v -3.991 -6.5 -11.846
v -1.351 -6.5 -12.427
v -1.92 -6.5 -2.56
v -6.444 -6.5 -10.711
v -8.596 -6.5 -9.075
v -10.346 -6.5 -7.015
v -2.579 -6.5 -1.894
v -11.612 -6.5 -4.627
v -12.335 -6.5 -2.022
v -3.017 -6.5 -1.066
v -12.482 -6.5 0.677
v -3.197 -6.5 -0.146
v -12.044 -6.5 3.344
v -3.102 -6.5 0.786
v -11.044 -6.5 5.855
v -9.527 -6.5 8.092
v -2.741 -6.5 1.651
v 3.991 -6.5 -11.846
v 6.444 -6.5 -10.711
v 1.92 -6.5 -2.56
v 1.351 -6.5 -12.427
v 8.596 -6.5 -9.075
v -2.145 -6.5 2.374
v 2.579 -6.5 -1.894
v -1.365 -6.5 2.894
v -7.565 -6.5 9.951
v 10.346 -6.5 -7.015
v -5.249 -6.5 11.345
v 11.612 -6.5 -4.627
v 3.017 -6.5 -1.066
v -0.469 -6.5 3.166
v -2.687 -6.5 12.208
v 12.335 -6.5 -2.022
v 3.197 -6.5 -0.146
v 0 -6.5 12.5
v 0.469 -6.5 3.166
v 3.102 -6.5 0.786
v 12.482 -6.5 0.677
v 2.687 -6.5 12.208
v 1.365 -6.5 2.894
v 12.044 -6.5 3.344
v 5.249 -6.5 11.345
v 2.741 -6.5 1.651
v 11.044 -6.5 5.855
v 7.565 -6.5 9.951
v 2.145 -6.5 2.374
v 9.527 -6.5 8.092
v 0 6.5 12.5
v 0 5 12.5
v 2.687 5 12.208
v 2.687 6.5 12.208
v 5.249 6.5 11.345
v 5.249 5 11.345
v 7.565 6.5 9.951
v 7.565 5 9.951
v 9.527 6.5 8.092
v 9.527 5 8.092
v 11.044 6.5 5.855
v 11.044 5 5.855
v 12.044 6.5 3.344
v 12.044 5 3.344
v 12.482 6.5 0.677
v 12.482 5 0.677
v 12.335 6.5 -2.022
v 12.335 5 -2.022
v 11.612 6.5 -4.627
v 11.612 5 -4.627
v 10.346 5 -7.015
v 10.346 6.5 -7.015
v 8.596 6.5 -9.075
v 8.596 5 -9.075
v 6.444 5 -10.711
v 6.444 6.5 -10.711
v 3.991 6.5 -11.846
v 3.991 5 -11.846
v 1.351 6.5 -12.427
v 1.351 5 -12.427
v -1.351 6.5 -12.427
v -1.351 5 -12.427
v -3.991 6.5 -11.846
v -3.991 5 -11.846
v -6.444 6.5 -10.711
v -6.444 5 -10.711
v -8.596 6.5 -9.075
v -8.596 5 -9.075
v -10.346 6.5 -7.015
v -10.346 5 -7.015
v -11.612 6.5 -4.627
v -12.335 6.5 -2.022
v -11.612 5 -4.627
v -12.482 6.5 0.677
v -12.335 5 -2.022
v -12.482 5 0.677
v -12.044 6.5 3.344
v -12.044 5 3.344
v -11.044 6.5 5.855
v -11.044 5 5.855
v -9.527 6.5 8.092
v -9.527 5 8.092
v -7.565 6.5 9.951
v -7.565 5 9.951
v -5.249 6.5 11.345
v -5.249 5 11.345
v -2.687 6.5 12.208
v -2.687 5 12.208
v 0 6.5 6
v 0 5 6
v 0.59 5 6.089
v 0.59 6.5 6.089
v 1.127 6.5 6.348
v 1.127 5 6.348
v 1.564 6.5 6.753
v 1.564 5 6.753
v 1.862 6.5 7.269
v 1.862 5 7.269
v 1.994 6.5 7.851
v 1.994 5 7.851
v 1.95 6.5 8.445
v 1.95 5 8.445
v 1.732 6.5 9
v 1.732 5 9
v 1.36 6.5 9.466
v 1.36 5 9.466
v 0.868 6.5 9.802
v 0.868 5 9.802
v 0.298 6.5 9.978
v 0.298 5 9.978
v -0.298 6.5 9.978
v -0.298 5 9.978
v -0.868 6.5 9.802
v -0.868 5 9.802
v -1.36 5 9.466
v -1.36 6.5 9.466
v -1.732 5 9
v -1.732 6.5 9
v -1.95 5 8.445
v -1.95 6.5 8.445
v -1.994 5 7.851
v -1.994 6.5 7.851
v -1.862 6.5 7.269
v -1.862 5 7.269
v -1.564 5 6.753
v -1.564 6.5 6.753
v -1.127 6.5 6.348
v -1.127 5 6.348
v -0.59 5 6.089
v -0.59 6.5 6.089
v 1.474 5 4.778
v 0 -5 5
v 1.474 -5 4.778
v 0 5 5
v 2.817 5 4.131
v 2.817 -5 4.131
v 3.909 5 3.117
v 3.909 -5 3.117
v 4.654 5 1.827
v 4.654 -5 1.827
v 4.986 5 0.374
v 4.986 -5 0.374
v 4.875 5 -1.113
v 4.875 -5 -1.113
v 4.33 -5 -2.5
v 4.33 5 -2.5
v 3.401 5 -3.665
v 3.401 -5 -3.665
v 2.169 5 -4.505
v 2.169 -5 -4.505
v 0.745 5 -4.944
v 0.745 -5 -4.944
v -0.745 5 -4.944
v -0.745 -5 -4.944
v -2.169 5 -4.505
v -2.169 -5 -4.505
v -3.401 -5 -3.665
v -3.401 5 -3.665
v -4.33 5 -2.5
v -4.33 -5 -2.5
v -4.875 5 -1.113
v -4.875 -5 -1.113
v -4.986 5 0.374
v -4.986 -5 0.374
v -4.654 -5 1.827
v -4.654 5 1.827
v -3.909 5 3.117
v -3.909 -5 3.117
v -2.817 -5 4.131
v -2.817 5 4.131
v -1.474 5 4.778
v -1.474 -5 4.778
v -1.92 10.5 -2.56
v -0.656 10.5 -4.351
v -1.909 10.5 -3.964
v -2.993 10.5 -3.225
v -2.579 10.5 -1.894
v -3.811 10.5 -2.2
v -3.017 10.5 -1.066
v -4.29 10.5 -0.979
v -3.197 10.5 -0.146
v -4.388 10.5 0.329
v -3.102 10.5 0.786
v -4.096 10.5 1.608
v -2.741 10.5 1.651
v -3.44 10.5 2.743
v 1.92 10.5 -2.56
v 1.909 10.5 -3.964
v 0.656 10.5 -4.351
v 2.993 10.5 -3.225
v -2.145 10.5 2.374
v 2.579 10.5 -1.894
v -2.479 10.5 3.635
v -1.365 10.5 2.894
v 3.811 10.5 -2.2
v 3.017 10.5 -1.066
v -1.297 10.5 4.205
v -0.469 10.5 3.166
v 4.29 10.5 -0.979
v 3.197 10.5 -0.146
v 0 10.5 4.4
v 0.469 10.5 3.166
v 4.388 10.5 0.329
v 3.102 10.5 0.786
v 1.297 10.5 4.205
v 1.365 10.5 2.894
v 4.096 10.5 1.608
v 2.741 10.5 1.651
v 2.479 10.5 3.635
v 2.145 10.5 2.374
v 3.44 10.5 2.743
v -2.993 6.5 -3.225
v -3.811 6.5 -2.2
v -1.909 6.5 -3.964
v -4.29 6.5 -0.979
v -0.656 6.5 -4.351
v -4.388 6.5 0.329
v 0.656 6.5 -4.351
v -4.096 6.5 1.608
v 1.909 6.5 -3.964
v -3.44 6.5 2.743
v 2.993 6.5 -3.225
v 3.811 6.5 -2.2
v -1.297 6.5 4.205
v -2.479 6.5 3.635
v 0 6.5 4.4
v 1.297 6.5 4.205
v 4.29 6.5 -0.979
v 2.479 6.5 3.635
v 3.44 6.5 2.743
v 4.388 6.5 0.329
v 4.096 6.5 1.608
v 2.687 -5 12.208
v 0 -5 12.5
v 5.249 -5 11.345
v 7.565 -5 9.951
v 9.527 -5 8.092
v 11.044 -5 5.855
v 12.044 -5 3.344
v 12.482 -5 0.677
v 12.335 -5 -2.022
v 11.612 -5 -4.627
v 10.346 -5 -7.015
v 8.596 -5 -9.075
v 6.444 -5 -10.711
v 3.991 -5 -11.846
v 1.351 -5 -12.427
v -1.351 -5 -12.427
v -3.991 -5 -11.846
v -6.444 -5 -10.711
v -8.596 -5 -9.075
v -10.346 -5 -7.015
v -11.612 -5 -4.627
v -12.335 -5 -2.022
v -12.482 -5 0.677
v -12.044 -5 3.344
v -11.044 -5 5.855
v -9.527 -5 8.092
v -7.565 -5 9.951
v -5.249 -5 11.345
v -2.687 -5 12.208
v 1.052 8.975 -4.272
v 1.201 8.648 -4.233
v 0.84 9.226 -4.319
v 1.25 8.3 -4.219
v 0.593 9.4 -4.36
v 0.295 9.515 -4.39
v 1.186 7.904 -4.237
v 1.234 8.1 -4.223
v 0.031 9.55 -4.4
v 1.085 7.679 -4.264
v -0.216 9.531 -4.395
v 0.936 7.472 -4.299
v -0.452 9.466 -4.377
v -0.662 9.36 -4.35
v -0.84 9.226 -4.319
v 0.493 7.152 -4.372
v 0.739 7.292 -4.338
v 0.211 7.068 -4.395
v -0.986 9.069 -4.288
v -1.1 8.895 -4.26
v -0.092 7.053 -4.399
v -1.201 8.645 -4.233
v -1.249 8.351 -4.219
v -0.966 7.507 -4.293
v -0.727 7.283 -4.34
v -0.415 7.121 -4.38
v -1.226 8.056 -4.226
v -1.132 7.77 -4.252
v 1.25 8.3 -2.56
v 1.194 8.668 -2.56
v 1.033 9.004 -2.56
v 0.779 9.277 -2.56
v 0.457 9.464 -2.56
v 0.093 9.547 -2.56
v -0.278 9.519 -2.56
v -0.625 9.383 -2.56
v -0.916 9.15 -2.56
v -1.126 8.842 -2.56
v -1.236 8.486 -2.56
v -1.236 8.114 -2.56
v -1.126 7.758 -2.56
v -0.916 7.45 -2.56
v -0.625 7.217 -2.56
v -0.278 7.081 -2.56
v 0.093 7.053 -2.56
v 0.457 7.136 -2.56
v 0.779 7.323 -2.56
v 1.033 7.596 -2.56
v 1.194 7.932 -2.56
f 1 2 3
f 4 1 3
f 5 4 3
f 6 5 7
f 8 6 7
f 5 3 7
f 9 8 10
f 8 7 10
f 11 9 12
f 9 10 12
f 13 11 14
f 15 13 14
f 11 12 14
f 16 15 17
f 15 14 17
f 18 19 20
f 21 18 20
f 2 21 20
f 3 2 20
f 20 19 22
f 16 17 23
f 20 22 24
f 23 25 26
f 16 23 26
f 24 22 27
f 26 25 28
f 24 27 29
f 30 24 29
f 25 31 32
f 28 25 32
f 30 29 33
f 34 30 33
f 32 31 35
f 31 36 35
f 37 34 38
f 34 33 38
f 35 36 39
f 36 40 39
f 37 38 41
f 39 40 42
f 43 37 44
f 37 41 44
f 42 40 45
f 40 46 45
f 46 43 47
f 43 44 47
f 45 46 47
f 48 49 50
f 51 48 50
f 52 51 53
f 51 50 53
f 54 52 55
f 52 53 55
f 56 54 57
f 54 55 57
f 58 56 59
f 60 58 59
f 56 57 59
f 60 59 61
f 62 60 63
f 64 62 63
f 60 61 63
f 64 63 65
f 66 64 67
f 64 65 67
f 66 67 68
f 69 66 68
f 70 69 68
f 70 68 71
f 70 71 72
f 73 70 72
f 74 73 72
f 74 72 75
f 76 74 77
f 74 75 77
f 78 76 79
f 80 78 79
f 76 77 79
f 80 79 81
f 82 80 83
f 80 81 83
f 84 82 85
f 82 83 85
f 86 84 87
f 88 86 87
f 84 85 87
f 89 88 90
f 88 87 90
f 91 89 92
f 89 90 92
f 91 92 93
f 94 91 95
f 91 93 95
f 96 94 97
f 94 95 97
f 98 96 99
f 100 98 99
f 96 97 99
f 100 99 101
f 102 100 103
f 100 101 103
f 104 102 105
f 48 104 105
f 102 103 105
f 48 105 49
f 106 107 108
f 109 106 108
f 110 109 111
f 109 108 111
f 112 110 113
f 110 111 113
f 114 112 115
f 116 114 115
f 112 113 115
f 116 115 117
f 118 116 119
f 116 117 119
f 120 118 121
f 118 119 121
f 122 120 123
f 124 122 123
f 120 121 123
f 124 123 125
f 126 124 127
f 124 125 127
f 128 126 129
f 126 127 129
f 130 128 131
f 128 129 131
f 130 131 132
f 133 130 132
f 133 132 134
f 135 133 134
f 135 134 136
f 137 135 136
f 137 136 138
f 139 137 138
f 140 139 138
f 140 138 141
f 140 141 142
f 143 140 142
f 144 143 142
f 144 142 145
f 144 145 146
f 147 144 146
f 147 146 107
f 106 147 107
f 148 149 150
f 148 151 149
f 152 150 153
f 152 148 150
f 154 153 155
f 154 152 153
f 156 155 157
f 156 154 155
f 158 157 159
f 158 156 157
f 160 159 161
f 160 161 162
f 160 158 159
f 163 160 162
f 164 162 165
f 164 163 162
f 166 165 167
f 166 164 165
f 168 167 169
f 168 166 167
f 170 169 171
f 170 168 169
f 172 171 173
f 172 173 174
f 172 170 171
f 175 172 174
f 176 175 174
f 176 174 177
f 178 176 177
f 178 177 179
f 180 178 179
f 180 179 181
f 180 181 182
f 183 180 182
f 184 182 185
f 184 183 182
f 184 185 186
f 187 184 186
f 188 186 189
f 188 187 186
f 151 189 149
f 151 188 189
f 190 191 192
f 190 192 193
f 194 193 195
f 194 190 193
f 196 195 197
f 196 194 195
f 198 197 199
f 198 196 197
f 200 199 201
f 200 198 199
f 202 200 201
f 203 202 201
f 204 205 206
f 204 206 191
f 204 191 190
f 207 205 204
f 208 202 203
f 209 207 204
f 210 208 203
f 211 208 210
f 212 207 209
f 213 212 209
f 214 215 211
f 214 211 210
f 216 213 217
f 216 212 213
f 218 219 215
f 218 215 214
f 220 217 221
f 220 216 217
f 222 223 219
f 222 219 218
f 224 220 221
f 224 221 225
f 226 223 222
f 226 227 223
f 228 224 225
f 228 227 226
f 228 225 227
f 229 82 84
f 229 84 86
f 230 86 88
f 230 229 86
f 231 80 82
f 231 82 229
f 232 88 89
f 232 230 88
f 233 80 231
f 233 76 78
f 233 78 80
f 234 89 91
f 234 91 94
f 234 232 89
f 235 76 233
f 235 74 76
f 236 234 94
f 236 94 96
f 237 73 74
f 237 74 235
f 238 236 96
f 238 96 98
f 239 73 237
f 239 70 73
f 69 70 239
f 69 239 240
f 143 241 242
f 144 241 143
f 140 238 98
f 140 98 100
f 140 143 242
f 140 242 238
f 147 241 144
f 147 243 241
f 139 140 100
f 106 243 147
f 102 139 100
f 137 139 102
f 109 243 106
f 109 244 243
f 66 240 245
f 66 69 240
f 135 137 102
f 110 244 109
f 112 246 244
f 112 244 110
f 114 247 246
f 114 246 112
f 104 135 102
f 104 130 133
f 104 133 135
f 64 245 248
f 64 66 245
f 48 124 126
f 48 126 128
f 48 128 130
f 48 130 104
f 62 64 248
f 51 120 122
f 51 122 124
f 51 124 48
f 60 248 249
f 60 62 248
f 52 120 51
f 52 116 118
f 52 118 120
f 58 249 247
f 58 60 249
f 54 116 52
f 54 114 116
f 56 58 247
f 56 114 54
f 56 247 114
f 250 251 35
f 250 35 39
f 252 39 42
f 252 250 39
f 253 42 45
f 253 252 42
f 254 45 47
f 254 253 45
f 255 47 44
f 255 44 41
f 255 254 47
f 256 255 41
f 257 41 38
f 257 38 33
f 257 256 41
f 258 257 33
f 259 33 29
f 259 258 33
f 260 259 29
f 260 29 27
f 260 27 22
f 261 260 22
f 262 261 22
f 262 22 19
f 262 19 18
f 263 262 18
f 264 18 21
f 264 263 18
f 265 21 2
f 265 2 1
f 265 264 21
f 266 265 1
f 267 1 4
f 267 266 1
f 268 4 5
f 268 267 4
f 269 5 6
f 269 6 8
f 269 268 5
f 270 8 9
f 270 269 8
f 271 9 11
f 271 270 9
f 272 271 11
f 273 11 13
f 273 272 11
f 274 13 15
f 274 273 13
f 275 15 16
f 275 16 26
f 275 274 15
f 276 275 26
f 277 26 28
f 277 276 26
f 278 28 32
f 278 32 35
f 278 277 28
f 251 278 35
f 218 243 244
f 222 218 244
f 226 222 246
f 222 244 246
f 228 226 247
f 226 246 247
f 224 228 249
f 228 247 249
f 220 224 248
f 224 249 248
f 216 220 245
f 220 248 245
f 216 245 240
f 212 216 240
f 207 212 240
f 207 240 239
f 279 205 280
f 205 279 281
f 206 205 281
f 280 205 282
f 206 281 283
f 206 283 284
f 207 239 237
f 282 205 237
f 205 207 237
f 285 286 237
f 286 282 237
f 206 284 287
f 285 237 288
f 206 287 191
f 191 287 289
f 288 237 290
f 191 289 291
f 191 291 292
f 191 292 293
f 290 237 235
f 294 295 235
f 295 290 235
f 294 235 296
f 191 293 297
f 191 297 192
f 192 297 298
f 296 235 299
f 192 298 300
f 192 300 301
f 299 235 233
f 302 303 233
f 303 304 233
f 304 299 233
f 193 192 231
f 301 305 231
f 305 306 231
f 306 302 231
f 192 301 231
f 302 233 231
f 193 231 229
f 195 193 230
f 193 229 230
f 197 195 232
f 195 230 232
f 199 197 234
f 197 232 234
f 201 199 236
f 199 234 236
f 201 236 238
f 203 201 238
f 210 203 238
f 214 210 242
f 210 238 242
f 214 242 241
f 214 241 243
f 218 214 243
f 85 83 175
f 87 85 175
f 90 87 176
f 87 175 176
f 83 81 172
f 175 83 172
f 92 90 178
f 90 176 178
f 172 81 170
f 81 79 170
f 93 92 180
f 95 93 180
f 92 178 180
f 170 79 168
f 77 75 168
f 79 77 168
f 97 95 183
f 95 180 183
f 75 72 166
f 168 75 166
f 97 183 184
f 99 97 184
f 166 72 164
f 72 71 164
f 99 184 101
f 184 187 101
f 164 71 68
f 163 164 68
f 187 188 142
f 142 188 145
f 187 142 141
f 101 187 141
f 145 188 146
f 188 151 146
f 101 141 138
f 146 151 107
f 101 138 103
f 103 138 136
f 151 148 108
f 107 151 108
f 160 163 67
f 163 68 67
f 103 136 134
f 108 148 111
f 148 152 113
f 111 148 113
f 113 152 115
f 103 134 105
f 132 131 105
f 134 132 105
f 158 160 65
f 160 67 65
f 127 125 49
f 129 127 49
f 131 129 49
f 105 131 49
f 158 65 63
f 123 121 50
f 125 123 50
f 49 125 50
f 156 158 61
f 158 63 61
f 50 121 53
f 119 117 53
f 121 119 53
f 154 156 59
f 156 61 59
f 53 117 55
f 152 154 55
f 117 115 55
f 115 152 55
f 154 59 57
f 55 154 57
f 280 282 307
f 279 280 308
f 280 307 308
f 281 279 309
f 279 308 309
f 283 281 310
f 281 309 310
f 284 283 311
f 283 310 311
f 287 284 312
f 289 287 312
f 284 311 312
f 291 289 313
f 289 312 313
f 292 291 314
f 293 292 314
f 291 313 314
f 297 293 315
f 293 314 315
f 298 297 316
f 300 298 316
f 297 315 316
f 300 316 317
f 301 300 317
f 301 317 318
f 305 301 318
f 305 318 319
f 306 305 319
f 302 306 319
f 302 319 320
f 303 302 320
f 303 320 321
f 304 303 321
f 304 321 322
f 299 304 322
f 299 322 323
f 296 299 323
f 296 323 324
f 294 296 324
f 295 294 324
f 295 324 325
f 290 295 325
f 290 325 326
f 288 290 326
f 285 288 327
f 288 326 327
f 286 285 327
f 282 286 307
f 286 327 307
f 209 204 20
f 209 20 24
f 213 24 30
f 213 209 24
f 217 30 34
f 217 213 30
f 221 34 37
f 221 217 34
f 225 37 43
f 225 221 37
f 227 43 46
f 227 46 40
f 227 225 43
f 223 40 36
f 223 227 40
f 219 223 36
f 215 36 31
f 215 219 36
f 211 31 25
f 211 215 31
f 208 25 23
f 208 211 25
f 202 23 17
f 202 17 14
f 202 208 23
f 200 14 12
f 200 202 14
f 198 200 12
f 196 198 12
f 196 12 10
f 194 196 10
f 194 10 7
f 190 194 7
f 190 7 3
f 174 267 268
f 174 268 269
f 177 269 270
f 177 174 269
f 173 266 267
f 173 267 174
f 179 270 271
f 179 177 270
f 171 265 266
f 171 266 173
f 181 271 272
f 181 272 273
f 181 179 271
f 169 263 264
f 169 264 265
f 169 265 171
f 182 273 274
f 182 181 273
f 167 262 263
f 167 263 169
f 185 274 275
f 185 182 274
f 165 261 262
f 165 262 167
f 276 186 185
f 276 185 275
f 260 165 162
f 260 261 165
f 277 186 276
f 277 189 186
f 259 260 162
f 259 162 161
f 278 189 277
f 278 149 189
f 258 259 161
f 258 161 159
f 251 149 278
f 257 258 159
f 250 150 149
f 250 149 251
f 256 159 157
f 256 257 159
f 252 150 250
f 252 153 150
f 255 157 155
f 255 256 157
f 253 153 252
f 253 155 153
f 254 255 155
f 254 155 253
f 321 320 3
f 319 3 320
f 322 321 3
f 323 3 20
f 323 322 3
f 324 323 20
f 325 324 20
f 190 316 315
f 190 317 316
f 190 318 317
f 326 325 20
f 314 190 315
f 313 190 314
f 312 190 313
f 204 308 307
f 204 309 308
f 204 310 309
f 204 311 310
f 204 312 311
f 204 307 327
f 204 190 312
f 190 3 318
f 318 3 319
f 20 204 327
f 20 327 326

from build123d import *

# Parameters (mm, degrees)
SKETCH2_R               = 5
BOSS_EXTRUDE1_DEPTH     = 5
SKETCH3_R               = 12.5
BOSS_EXTRUDE2_DEPTH     = 1.5
CUT_EXTRUDE1_DEPTH      = 22.943108257
CUT_EXTRUDE1_DEPTH_BACK = 22.943108257
SKETCH5_R               = 4.4
BOSS_EXTRUDE3_DEPTH     = 4
CUT_EXTRUDE2_DEPTH      = 25.525496937
SKETCH7_R               = 1.25
CUT_EXTRUDE3_DEPTH      = 23.210438987
SKETCH9_R               = 2
CUT_EXTRUDE4_DEPTH      = 22.089096709


with BuildPart() as part:
    # Sketch2 → Boss-Extrude1 (new, symmetric)
    with BuildSketch(Plane(origin=(0, 0, 0), x_dir=(1, 0, 0), z_dir=(0, 1, 0))):
        with Locations(Location((0, 0, 0), (0, 0, 270))):
            Circle(SKETCH2_R)
    extrude(amount=BOSS_EXTRUDE1_DEPTH, both=True)

    # Sketch3 → Boss-Extrude2 (add)
    with BuildSketch(Plane(origin=(0, 5, 0), x_dir=(1, 0, 0), z_dir=(0, 1, 0))):
        with Locations(Location((0, 0, 0), (0, 0, 270))):
            Circle(SKETCH3_R)
    boss_extrude2 = extrude(amount=BOSS_EXTRUDE2_DEPTH)

    # Mirror1: Boss-Extrude2 across plane
    add(boss_extrude2.mirror(Plane.ZX))

    # Sketch4 → Cut-Extrude1 (cut, two sides: drawn at the far end of the back side and taken through both)
    with BuildSketch(Plane(origin=(0, 6.5, 0), x_dir=(1, 0, 0), z_dir=(0, 1, 0)).offset(-CUT_EXTRUDE1_DEPTH_BACK)):
        with BuildLine():
            Line((-1.92, 2.56), (1.92, 2.56))
            ThreePointArc((1.92, 2.56), (0, -3.2), (-1.92, 2.56))
        make_face()
    extrude(amount=CUT_EXTRUDE1_DEPTH + CUT_EXTRUDE1_DEPTH_BACK, mode=Mode.SUBTRACT)

    # Sketch5 → Boss-Extrude3 (add)
    with BuildSketch(Plane(origin=(0, 6.5, 0), x_dir=(1, 0, 0), z_dir=(0, 1, 0))):
        with Locations(Location((0, 0, 0), (0, 0, 270))):
            Circle(SKETCH5_R)
    extrude(amount=BOSS_EXTRUDE3_DEPTH)

    # Sketch6 → Cut-Extrude2 (cut, through all)
    with BuildSketch(Plane(origin=(0, 10.5, 0), x_dir=(1, 0, 0), z_dir=(0, 1, 0))):
        with BuildLine():
            Line((-1.92, 2.56), (1.92, 2.56))
            ThreePointArc((1.92, 2.56), (0, -3.2), (-1.92, 2.56))
        make_face()
    extrude(amount=-CUT_EXTRUDE2_DEPTH, mode=Mode.SUBTRACT)

    # Sketch7 → Cut-Extrude3 (cut, through all)
    with BuildSketch(Plane.XY.offset(-2.56)):
        with Locations((0, 8.3)):
            Circle(SKETCH7_R)
    extrude(amount=-CUT_EXTRUDE3_DEPTH, mode=Mode.SUBTRACT)

    # Sketch9 → Cut-Extrude4 (cut, through all)
    with BuildSketch(Plane.XZ.offset(-5)):
        with Locations(Location((0, 8, 0), (0, 0, 270))):
            Circle(SKETCH9_R)
    extrude(amount=-CUT_EXTRUDE4_DEPTH, mode=Mode.SUBTRACT)


solid = part.part
